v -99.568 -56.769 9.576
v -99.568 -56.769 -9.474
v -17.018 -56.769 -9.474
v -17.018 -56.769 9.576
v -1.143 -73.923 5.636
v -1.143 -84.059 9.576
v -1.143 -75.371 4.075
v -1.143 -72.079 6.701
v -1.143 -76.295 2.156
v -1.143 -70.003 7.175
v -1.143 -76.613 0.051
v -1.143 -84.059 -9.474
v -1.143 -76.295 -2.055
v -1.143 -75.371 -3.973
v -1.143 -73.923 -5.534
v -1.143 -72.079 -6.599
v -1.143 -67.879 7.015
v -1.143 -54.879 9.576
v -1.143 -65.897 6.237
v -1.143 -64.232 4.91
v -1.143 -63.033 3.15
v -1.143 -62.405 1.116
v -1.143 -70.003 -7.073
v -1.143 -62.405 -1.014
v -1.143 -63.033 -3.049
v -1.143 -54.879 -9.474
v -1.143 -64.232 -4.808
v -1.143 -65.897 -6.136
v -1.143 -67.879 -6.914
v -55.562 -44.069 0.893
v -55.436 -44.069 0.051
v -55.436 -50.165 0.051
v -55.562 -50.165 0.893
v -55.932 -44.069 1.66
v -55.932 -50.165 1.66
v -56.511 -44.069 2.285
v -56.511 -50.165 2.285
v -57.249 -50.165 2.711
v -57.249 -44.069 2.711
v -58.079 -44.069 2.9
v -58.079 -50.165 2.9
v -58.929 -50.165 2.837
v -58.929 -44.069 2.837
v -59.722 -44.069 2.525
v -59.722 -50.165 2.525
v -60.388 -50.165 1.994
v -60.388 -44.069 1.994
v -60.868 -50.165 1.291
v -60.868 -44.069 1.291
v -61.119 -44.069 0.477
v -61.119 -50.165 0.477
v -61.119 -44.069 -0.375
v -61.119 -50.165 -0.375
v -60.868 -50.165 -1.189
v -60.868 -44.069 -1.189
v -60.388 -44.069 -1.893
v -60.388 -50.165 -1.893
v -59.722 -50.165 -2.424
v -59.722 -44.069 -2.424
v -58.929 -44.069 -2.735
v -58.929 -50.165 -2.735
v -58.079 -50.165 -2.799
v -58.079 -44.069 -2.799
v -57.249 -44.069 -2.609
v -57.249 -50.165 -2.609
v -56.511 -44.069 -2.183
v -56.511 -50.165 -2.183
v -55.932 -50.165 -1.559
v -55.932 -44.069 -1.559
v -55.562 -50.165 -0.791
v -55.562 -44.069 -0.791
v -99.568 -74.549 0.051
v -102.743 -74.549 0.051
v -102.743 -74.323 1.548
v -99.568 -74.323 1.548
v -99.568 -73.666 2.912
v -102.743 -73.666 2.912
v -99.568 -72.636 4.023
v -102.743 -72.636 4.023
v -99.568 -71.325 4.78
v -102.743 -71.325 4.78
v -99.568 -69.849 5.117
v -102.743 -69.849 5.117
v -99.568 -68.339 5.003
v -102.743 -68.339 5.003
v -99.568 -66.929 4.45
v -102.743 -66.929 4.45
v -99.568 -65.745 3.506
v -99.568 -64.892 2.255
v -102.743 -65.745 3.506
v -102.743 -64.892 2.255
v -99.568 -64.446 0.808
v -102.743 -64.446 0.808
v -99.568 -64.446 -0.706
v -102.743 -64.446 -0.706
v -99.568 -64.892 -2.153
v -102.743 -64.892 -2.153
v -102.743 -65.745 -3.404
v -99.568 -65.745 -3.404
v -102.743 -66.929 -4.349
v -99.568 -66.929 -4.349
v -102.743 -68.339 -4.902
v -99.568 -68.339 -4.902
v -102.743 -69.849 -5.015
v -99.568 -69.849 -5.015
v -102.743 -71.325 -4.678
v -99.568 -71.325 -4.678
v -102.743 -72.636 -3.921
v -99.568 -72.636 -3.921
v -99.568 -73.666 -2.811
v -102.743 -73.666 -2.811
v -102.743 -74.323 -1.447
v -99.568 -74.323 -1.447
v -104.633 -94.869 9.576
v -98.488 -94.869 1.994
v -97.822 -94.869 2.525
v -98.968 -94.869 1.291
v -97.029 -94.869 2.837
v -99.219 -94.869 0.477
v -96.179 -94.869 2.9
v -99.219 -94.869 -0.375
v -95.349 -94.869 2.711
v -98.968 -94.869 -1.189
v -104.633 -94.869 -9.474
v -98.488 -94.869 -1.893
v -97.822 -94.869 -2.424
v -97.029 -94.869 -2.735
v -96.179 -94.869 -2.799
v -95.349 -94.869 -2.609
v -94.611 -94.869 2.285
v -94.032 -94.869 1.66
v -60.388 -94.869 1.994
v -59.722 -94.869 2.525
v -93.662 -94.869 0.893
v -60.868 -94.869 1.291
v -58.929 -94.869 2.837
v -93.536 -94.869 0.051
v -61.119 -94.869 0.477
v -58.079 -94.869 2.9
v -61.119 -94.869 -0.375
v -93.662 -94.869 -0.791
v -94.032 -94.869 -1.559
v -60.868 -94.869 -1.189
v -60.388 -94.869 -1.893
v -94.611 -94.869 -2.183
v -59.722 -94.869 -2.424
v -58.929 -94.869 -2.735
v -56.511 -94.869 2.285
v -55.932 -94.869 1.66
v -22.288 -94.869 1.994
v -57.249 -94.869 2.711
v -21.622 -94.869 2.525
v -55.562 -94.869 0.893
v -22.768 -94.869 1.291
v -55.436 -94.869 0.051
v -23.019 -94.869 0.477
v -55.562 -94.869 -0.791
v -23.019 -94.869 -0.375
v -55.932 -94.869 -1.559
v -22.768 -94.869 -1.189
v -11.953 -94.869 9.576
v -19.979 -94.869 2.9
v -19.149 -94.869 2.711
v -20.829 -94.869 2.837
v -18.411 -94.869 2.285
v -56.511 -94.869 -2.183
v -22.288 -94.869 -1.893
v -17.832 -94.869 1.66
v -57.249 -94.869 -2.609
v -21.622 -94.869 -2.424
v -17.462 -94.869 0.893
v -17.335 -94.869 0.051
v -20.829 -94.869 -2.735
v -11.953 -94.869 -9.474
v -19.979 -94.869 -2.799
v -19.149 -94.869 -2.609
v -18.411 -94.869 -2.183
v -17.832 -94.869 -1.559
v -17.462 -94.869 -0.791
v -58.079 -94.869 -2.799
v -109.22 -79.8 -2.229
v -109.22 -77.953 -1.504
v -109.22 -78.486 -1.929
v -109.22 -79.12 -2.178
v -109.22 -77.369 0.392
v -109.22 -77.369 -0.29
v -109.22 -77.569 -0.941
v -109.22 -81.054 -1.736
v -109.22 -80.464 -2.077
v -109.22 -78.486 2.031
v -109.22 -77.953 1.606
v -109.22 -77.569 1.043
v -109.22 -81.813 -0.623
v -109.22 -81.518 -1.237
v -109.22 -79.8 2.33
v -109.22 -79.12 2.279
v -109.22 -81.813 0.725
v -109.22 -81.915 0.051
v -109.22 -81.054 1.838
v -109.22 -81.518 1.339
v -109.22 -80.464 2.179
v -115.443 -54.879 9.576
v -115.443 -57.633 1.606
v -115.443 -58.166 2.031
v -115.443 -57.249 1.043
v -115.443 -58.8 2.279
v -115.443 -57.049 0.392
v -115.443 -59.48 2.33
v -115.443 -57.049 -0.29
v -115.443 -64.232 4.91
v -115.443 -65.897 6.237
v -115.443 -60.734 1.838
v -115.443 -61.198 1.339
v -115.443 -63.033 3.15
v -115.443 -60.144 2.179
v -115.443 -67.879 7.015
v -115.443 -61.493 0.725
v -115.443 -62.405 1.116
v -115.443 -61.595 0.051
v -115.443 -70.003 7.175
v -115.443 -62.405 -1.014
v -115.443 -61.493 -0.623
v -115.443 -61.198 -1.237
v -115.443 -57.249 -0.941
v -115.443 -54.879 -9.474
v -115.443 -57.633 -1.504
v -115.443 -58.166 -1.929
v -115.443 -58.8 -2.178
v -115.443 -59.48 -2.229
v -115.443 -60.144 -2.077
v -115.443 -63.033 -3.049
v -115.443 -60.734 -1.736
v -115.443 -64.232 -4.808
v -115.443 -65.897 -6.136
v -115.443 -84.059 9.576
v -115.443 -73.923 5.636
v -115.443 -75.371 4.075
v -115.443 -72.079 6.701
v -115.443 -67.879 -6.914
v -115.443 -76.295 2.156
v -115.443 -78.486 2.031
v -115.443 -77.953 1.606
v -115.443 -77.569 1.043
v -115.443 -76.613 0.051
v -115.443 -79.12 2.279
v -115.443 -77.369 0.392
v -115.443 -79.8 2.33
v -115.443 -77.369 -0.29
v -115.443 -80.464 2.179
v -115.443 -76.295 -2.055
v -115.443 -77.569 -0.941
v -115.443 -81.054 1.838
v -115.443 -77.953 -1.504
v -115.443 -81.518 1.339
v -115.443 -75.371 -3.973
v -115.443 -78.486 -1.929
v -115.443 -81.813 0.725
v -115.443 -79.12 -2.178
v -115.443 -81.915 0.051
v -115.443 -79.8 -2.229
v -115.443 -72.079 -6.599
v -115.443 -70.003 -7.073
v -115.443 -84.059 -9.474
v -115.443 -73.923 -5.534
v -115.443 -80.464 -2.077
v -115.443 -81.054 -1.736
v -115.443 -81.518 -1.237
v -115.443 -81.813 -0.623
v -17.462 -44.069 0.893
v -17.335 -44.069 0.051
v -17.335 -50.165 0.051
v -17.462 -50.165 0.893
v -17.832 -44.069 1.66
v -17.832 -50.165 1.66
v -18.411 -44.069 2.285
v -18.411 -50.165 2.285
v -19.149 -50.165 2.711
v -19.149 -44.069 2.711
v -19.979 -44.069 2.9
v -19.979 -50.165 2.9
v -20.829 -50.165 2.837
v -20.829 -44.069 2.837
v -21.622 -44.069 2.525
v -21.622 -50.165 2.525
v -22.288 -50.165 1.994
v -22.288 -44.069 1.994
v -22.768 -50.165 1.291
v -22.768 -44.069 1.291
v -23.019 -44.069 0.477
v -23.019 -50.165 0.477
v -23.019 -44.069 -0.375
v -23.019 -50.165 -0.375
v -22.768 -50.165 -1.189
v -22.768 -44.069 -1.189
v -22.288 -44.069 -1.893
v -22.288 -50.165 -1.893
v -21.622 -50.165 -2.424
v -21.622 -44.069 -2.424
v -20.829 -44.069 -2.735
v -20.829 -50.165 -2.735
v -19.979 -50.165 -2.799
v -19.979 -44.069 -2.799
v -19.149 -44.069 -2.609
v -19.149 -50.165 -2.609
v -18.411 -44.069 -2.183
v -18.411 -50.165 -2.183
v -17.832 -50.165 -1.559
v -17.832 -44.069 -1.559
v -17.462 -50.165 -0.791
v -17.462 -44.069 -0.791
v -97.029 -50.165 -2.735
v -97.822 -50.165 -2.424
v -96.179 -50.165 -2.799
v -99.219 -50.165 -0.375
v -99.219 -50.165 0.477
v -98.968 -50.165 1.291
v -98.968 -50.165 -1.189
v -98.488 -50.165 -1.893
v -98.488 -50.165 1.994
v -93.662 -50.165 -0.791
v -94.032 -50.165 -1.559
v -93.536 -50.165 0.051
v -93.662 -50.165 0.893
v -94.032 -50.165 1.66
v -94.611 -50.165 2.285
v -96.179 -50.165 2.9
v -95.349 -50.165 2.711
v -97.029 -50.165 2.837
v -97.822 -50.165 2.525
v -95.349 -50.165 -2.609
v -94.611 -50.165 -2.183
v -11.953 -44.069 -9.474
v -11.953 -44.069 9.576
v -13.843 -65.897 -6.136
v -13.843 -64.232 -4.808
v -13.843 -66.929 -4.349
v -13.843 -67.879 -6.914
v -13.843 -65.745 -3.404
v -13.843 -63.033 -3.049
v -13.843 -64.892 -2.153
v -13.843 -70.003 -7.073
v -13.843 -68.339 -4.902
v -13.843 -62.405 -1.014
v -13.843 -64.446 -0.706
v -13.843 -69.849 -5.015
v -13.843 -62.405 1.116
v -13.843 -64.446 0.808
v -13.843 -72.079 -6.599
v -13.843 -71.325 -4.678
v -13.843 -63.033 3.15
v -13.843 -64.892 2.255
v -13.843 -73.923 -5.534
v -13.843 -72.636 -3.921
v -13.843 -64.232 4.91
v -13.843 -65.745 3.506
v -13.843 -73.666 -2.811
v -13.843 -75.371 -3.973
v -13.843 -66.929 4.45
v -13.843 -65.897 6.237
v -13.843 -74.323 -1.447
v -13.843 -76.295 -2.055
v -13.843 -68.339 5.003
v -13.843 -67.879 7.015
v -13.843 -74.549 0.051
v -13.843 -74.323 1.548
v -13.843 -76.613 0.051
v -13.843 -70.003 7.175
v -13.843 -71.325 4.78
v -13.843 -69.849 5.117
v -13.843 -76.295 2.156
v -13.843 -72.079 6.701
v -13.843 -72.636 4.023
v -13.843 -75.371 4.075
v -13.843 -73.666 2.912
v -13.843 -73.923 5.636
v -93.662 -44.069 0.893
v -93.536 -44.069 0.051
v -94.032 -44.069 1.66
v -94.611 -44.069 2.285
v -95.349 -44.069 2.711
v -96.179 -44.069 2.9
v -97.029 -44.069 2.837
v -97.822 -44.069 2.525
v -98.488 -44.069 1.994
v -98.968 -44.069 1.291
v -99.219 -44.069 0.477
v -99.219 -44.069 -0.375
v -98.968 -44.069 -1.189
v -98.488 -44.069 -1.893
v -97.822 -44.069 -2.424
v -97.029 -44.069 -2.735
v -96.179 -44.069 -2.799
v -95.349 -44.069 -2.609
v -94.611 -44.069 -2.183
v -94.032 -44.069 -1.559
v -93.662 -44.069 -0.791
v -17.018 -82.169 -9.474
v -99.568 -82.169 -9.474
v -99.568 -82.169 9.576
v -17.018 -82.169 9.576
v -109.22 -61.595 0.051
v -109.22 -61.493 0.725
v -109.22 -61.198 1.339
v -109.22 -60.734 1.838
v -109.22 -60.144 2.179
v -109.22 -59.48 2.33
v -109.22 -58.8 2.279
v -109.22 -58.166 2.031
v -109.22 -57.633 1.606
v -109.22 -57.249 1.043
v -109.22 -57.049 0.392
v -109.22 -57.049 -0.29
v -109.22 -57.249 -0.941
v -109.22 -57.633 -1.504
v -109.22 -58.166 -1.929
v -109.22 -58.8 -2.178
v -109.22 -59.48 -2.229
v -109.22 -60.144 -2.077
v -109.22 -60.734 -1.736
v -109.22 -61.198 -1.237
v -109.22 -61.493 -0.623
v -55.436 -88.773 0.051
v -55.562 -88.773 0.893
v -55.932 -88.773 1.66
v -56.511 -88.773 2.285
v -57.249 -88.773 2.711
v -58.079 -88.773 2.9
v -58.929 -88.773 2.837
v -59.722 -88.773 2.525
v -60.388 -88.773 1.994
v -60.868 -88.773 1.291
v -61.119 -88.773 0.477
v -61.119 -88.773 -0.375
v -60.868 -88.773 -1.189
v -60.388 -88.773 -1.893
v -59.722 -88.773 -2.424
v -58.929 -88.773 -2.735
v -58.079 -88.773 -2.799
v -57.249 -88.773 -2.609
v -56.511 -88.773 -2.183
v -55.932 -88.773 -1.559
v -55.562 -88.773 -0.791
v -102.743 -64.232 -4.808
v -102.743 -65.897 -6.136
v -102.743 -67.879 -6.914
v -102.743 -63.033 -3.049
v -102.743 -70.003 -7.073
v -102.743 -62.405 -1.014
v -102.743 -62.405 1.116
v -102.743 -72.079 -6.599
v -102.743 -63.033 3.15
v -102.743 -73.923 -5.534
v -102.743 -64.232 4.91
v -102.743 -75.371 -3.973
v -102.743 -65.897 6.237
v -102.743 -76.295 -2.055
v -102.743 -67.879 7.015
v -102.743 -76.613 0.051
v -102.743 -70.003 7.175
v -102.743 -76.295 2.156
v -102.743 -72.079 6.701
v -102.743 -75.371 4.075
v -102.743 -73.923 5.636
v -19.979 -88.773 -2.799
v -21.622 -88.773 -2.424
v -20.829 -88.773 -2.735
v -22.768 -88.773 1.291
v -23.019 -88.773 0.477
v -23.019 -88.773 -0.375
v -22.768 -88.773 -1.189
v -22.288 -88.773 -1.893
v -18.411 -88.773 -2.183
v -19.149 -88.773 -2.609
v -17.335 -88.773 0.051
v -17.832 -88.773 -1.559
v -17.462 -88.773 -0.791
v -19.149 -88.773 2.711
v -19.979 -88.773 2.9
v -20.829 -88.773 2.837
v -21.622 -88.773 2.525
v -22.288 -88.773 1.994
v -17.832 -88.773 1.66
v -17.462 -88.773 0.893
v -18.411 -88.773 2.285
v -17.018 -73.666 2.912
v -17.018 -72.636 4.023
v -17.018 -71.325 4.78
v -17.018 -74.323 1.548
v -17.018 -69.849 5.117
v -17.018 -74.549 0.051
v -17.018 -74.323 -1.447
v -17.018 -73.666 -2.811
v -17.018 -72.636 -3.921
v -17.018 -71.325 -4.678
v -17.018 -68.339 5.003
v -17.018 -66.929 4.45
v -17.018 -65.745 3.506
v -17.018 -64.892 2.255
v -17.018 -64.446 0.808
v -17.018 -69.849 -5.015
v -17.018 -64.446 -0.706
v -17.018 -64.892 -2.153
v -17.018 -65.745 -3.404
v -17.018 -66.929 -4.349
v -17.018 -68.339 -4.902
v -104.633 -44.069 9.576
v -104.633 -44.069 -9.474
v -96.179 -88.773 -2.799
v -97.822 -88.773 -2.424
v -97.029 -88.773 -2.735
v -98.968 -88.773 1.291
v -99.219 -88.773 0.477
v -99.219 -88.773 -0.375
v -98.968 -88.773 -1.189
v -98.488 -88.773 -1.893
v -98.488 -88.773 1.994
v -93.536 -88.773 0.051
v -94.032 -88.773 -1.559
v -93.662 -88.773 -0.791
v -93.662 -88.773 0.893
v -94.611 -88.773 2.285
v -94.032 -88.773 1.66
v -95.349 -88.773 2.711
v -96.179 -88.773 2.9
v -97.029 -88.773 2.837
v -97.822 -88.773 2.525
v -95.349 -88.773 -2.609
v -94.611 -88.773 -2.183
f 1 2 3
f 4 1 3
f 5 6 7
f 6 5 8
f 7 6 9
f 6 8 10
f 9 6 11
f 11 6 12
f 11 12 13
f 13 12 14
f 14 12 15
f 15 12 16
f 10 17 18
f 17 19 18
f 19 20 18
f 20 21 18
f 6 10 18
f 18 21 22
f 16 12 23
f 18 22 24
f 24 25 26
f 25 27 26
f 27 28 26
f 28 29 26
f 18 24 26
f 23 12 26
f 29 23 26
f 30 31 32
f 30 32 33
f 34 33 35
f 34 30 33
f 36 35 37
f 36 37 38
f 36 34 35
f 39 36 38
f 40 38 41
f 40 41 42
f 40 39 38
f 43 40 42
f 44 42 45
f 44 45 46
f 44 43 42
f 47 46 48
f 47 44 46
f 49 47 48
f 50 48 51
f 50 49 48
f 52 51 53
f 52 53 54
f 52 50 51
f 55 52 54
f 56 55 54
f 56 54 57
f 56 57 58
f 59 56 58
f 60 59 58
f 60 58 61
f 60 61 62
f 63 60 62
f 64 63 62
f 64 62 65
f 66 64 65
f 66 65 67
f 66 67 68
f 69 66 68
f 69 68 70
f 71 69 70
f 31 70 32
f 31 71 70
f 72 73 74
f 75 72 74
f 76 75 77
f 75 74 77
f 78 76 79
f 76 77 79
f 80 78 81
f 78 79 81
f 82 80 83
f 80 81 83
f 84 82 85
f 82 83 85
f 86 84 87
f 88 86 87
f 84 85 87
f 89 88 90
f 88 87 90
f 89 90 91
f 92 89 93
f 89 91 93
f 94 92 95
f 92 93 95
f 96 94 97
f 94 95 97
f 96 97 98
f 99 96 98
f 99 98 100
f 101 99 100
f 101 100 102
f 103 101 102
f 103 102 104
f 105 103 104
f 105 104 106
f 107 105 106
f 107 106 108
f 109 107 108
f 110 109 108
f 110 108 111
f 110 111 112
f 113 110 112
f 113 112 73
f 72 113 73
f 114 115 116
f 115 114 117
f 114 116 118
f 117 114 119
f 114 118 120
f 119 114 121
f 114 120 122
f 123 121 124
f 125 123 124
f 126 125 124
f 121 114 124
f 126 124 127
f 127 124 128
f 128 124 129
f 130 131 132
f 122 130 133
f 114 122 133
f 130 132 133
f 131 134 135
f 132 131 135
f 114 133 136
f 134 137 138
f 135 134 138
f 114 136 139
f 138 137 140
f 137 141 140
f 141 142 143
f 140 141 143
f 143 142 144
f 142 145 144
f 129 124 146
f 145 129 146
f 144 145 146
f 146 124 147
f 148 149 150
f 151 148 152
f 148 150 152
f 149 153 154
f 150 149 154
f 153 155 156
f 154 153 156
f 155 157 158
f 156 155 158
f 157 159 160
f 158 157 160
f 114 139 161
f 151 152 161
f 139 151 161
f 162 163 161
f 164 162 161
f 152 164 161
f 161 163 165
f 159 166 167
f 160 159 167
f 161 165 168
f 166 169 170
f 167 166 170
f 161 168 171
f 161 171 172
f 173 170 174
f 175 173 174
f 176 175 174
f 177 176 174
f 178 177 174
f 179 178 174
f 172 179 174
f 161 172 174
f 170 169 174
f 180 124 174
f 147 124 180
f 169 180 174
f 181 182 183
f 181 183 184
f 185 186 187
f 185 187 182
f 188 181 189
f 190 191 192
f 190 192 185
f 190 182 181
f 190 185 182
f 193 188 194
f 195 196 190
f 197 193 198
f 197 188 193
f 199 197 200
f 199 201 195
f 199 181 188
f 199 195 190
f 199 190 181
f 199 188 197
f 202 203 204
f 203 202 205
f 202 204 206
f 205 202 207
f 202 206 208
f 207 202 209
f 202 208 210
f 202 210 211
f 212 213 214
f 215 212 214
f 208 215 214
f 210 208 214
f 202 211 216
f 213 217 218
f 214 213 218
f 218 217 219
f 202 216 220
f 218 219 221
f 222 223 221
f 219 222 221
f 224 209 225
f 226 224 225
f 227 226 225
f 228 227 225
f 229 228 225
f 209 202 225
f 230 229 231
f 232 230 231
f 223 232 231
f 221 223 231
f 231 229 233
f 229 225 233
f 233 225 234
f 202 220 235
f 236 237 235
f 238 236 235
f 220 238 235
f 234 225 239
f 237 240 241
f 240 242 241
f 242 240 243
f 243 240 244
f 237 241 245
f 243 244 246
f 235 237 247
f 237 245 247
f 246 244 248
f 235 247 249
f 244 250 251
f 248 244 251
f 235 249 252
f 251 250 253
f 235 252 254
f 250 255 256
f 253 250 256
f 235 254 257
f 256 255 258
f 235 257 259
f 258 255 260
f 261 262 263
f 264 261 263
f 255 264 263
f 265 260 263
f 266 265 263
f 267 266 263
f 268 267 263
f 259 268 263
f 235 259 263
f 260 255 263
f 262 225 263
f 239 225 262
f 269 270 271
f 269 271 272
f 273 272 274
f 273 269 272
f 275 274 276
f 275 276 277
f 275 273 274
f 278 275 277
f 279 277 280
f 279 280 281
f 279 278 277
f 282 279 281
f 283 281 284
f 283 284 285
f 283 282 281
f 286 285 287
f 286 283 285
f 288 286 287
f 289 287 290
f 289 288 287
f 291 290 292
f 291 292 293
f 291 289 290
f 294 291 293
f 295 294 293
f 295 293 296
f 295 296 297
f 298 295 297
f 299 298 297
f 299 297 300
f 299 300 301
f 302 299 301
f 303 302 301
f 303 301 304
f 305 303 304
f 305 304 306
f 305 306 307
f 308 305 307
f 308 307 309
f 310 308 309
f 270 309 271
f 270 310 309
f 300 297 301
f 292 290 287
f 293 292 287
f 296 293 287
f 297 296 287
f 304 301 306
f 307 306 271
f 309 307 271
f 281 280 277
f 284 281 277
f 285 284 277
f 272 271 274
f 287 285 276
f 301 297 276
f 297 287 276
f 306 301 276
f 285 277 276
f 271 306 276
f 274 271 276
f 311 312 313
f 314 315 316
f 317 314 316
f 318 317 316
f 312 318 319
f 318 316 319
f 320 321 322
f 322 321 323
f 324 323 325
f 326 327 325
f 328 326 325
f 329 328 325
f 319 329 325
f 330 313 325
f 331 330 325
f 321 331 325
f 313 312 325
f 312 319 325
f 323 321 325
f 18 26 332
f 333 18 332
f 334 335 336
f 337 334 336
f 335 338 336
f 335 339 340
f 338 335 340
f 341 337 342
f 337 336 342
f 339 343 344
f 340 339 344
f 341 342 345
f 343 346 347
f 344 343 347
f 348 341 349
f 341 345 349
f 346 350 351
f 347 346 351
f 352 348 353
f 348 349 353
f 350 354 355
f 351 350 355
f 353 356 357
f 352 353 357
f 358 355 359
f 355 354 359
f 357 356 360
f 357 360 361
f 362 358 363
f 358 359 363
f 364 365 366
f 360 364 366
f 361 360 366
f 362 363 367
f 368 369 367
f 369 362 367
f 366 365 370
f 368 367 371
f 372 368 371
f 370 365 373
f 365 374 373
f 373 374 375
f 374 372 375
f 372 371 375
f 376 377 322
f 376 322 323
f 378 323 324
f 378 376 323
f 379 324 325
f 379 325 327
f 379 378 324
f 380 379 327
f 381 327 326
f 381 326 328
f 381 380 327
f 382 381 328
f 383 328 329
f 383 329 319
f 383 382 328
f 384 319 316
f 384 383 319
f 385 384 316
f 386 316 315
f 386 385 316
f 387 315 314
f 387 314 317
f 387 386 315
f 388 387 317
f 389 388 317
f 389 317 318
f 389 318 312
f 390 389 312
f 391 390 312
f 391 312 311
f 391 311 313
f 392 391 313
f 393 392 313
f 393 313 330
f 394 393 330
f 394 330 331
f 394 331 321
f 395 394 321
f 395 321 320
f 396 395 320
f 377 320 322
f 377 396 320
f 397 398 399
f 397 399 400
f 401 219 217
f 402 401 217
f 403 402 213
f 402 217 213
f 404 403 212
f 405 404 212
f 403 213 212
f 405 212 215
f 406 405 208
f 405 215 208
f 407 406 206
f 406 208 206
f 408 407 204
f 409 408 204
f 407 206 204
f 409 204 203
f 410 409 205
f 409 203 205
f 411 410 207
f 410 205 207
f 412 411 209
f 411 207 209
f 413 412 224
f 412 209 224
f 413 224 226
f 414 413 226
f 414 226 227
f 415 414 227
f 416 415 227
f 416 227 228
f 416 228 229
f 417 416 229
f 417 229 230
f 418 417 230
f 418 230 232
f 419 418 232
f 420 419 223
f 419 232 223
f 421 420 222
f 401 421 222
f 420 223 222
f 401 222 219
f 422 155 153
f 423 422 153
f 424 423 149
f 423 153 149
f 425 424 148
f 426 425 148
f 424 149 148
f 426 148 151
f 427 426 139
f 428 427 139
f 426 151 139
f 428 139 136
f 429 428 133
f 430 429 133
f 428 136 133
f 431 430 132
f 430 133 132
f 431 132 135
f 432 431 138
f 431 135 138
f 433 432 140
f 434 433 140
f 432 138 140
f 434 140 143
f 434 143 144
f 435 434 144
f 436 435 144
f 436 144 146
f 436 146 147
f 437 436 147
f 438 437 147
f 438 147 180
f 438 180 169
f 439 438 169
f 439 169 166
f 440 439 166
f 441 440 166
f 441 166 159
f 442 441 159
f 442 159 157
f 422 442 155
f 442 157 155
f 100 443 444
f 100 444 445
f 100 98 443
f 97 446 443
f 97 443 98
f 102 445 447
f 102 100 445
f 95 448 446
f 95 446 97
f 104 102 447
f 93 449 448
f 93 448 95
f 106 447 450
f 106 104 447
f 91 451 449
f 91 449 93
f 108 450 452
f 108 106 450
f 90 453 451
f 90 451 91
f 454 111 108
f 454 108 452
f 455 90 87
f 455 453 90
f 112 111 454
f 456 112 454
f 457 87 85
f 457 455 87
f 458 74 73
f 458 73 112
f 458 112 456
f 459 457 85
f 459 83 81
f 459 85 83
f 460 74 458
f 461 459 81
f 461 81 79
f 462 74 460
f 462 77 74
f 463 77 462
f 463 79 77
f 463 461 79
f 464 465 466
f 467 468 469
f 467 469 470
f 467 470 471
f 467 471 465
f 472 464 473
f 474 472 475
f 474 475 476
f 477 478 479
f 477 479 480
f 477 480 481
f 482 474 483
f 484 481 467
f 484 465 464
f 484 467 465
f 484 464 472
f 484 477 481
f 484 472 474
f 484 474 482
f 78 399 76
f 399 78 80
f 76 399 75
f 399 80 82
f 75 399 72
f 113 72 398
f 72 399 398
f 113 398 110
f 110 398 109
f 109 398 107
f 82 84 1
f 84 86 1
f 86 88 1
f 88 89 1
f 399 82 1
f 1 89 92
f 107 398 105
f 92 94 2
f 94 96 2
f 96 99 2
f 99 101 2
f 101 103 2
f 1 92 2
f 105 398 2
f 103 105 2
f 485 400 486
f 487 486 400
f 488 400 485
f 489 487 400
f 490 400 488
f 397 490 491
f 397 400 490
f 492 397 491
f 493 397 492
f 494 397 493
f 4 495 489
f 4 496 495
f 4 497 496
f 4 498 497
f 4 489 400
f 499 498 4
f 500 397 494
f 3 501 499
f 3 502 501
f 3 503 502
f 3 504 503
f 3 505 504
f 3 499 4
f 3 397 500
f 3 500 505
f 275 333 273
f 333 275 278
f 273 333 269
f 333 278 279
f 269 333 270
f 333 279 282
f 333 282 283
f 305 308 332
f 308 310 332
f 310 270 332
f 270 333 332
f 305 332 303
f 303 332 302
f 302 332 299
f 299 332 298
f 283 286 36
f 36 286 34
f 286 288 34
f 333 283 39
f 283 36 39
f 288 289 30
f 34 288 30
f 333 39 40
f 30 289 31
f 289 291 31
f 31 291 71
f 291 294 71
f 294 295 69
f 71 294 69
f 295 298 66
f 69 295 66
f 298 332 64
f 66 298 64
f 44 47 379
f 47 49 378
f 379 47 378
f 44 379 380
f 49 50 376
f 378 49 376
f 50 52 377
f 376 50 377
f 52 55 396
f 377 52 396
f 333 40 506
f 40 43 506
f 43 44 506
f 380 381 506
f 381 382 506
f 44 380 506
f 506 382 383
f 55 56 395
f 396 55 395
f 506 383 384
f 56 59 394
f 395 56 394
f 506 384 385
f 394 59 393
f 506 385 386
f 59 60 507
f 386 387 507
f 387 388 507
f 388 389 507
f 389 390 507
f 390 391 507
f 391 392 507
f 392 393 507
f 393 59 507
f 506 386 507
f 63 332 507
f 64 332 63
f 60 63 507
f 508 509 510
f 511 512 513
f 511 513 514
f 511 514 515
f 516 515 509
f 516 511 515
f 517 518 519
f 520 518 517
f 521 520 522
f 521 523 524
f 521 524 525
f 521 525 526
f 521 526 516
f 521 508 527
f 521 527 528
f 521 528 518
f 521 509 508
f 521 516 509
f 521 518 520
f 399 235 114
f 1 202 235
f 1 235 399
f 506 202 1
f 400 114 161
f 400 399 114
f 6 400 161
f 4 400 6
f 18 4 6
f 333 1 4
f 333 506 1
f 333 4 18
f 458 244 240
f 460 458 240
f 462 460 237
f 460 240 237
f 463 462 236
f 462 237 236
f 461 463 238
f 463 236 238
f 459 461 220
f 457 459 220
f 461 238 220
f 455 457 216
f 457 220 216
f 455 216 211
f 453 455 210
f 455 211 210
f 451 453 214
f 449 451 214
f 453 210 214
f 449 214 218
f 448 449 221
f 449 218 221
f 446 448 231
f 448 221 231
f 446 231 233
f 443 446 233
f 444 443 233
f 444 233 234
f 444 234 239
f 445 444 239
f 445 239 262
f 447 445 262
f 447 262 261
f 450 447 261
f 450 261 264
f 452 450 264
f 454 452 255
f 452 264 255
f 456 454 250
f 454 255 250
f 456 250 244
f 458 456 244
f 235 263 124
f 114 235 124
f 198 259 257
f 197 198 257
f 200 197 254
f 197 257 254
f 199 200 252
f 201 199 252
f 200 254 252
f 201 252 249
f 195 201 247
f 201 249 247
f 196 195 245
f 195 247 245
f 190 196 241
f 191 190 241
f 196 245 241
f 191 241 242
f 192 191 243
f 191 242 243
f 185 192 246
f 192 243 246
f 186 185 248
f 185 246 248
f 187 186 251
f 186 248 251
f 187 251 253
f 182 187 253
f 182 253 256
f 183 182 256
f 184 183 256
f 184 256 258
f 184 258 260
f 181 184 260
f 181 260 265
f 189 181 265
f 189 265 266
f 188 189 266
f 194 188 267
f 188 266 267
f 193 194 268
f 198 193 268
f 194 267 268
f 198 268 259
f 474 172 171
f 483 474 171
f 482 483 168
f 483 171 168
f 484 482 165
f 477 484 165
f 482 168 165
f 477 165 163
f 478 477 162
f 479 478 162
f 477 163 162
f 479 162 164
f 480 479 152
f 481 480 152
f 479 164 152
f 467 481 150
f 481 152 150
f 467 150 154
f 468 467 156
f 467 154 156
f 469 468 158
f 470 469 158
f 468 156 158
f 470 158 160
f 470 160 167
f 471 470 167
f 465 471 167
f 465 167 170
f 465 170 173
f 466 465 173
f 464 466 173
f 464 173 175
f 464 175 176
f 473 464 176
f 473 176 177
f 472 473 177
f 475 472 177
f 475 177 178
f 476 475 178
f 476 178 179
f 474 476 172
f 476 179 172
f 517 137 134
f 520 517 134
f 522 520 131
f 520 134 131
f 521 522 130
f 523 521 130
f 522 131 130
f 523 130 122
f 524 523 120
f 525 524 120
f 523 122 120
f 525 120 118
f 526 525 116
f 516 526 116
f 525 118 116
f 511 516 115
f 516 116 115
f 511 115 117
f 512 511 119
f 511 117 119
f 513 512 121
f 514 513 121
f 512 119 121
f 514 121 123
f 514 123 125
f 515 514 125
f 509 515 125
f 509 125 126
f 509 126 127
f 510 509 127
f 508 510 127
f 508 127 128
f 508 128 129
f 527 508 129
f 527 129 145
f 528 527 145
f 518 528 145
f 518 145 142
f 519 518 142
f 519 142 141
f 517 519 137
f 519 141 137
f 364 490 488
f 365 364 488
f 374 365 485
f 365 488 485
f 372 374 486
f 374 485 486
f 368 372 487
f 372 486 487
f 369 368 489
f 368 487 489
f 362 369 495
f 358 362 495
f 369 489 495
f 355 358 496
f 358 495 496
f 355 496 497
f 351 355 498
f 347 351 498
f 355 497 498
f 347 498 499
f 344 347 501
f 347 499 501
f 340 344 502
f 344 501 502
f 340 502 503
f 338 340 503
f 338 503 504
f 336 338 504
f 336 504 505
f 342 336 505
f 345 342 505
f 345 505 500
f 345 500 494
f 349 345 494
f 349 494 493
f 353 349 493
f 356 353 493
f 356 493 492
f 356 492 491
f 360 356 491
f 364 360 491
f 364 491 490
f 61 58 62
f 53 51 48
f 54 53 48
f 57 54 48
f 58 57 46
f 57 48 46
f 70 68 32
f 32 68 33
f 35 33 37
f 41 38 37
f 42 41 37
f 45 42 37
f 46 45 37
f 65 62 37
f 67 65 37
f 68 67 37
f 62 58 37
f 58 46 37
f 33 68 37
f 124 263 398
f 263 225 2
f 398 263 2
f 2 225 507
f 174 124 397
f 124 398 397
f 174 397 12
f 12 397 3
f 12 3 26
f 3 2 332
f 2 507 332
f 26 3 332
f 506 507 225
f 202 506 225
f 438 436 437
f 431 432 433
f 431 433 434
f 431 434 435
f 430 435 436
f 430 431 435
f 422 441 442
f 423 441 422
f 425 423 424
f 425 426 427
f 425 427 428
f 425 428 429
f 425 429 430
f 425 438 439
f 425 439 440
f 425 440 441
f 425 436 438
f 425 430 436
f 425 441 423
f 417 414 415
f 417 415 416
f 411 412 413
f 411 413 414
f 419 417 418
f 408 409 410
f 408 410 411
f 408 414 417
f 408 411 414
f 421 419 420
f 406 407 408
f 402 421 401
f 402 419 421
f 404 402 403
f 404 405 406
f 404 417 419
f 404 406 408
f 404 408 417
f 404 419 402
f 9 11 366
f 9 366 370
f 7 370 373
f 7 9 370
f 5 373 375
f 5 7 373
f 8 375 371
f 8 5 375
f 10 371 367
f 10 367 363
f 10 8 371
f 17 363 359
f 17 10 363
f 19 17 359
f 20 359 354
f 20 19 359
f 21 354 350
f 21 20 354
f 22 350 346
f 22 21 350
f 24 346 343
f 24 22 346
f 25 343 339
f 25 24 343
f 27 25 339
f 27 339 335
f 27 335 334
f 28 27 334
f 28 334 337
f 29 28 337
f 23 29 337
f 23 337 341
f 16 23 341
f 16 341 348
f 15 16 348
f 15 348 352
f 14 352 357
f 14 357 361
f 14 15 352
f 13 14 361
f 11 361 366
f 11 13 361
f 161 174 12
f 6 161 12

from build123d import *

# Parameters (mm, degrees)
SKETCH002_W     = 82.55
SKETCH002_H     = 25.4
PAD001_DEPTH    = 19.05
SKETCH003_R     = 5.08
POCKET001_DEPTH = 114.301
SKETCH100_R     = 2.286
POCKET027_DEPTH = 6.223
SKETCH101_R     = 7.14375
POCKET028_DEPTH = 12.7
SKETCH118_R     = 2.8575
POCKET042_DEPTH = 6.096


with BuildPart() as part:
    # Sketch002 → Pad001 (new body)
    with BuildSketch(Plane.XY):
        Polygon((-57.15, 14.589816), (-57.15, -14.589816), (-46.339816, -25.4), (46.339816, -25.4), (57.15, -14.589816), (57.15, 14.589816), (46.339816, 25.4), (-46.339816, 25.4), align=None)
        Rectangle(SKETCH002_W, SKETCH002_H, mode=Mode.SUBTRACT)
    extrude(amount=PAD001_DEPTH)

    # Sketch003 (on Face1 of Pad001) → Pocket001 (cut, through all)
    with BuildSketch(Plane(origin=(-57.15, 0, 0), x_dir=(0, -1, 0), z_dir=(-1, 0, 0))):
        with Locations((0, 9.525)):
            Circle(SKETCH003_R)
    extrude(amount=-POCKET001_DEPTH, mode=Mode.SUBTRACT)

    # Sketch100 (on Face1 of Pocket001) → Pocket027 (cut)
    with BuildSketch(Plane(origin=(-57.15, 0, 0), x_dir=(0, -1, 0), z_dir=(-1, 0, 0))):
        with Locations((10.16, 9.525)):
            Circle(SKETCH100_R)
        with Locations((-10.16, 9.525)):
            Circle(SKETCH100_R)
    extrude(amount=-POCKET027_DEPTH, mode=Mode.SUBTRACT)

    # Sketch101 (on Face1 of Pocket027) → Pocket028 (cut)
    with BuildSketch(Plane(origin=(-57.15, 0, 0), x_dir=(0, -1, 0), z_dir=(-1, 0, 0))):
        with Locations((0, 9.525)):
            Circle(SKETCH101_R)
    pocket028 = extrude(amount=-POCKET028_DEPTH, mode=Mode.SUBTRACT)

    # Mirrored002: Pocket028 across YZ
    add(pocket028.mirror(Plane.YZ), mode=Mode.SUBTRACT)

    # Sketch118 (on Face10 of Mirrored002) → Pocket042 (cut)
    with BuildSketch(Plane.XZ.offset(25.4)):
        with Locations((0, 9.525)):
            Circle(SKETCH118_R)
        with Locations((38.1, 9.525)):
            Circle(SKETCH118_R)
        with Locations((-38.1, 9.525)):
            Circle(SKETCH118_R)
    pocket042 = extrude(amount=-POCKET042_DEPTH, mode=Mode.SUBTRACT)

    # Mirrored004: Pocket042 across XZ
    add(pocket042.mirror(Plane.XZ), mode=Mode.SUBTRACT)


with BuildPart() as part_1:
    # Body001 placement: moved
    add(part.part.moved(Location((-58.293, -69.469, -9.4742))))


solid = part_1.part
